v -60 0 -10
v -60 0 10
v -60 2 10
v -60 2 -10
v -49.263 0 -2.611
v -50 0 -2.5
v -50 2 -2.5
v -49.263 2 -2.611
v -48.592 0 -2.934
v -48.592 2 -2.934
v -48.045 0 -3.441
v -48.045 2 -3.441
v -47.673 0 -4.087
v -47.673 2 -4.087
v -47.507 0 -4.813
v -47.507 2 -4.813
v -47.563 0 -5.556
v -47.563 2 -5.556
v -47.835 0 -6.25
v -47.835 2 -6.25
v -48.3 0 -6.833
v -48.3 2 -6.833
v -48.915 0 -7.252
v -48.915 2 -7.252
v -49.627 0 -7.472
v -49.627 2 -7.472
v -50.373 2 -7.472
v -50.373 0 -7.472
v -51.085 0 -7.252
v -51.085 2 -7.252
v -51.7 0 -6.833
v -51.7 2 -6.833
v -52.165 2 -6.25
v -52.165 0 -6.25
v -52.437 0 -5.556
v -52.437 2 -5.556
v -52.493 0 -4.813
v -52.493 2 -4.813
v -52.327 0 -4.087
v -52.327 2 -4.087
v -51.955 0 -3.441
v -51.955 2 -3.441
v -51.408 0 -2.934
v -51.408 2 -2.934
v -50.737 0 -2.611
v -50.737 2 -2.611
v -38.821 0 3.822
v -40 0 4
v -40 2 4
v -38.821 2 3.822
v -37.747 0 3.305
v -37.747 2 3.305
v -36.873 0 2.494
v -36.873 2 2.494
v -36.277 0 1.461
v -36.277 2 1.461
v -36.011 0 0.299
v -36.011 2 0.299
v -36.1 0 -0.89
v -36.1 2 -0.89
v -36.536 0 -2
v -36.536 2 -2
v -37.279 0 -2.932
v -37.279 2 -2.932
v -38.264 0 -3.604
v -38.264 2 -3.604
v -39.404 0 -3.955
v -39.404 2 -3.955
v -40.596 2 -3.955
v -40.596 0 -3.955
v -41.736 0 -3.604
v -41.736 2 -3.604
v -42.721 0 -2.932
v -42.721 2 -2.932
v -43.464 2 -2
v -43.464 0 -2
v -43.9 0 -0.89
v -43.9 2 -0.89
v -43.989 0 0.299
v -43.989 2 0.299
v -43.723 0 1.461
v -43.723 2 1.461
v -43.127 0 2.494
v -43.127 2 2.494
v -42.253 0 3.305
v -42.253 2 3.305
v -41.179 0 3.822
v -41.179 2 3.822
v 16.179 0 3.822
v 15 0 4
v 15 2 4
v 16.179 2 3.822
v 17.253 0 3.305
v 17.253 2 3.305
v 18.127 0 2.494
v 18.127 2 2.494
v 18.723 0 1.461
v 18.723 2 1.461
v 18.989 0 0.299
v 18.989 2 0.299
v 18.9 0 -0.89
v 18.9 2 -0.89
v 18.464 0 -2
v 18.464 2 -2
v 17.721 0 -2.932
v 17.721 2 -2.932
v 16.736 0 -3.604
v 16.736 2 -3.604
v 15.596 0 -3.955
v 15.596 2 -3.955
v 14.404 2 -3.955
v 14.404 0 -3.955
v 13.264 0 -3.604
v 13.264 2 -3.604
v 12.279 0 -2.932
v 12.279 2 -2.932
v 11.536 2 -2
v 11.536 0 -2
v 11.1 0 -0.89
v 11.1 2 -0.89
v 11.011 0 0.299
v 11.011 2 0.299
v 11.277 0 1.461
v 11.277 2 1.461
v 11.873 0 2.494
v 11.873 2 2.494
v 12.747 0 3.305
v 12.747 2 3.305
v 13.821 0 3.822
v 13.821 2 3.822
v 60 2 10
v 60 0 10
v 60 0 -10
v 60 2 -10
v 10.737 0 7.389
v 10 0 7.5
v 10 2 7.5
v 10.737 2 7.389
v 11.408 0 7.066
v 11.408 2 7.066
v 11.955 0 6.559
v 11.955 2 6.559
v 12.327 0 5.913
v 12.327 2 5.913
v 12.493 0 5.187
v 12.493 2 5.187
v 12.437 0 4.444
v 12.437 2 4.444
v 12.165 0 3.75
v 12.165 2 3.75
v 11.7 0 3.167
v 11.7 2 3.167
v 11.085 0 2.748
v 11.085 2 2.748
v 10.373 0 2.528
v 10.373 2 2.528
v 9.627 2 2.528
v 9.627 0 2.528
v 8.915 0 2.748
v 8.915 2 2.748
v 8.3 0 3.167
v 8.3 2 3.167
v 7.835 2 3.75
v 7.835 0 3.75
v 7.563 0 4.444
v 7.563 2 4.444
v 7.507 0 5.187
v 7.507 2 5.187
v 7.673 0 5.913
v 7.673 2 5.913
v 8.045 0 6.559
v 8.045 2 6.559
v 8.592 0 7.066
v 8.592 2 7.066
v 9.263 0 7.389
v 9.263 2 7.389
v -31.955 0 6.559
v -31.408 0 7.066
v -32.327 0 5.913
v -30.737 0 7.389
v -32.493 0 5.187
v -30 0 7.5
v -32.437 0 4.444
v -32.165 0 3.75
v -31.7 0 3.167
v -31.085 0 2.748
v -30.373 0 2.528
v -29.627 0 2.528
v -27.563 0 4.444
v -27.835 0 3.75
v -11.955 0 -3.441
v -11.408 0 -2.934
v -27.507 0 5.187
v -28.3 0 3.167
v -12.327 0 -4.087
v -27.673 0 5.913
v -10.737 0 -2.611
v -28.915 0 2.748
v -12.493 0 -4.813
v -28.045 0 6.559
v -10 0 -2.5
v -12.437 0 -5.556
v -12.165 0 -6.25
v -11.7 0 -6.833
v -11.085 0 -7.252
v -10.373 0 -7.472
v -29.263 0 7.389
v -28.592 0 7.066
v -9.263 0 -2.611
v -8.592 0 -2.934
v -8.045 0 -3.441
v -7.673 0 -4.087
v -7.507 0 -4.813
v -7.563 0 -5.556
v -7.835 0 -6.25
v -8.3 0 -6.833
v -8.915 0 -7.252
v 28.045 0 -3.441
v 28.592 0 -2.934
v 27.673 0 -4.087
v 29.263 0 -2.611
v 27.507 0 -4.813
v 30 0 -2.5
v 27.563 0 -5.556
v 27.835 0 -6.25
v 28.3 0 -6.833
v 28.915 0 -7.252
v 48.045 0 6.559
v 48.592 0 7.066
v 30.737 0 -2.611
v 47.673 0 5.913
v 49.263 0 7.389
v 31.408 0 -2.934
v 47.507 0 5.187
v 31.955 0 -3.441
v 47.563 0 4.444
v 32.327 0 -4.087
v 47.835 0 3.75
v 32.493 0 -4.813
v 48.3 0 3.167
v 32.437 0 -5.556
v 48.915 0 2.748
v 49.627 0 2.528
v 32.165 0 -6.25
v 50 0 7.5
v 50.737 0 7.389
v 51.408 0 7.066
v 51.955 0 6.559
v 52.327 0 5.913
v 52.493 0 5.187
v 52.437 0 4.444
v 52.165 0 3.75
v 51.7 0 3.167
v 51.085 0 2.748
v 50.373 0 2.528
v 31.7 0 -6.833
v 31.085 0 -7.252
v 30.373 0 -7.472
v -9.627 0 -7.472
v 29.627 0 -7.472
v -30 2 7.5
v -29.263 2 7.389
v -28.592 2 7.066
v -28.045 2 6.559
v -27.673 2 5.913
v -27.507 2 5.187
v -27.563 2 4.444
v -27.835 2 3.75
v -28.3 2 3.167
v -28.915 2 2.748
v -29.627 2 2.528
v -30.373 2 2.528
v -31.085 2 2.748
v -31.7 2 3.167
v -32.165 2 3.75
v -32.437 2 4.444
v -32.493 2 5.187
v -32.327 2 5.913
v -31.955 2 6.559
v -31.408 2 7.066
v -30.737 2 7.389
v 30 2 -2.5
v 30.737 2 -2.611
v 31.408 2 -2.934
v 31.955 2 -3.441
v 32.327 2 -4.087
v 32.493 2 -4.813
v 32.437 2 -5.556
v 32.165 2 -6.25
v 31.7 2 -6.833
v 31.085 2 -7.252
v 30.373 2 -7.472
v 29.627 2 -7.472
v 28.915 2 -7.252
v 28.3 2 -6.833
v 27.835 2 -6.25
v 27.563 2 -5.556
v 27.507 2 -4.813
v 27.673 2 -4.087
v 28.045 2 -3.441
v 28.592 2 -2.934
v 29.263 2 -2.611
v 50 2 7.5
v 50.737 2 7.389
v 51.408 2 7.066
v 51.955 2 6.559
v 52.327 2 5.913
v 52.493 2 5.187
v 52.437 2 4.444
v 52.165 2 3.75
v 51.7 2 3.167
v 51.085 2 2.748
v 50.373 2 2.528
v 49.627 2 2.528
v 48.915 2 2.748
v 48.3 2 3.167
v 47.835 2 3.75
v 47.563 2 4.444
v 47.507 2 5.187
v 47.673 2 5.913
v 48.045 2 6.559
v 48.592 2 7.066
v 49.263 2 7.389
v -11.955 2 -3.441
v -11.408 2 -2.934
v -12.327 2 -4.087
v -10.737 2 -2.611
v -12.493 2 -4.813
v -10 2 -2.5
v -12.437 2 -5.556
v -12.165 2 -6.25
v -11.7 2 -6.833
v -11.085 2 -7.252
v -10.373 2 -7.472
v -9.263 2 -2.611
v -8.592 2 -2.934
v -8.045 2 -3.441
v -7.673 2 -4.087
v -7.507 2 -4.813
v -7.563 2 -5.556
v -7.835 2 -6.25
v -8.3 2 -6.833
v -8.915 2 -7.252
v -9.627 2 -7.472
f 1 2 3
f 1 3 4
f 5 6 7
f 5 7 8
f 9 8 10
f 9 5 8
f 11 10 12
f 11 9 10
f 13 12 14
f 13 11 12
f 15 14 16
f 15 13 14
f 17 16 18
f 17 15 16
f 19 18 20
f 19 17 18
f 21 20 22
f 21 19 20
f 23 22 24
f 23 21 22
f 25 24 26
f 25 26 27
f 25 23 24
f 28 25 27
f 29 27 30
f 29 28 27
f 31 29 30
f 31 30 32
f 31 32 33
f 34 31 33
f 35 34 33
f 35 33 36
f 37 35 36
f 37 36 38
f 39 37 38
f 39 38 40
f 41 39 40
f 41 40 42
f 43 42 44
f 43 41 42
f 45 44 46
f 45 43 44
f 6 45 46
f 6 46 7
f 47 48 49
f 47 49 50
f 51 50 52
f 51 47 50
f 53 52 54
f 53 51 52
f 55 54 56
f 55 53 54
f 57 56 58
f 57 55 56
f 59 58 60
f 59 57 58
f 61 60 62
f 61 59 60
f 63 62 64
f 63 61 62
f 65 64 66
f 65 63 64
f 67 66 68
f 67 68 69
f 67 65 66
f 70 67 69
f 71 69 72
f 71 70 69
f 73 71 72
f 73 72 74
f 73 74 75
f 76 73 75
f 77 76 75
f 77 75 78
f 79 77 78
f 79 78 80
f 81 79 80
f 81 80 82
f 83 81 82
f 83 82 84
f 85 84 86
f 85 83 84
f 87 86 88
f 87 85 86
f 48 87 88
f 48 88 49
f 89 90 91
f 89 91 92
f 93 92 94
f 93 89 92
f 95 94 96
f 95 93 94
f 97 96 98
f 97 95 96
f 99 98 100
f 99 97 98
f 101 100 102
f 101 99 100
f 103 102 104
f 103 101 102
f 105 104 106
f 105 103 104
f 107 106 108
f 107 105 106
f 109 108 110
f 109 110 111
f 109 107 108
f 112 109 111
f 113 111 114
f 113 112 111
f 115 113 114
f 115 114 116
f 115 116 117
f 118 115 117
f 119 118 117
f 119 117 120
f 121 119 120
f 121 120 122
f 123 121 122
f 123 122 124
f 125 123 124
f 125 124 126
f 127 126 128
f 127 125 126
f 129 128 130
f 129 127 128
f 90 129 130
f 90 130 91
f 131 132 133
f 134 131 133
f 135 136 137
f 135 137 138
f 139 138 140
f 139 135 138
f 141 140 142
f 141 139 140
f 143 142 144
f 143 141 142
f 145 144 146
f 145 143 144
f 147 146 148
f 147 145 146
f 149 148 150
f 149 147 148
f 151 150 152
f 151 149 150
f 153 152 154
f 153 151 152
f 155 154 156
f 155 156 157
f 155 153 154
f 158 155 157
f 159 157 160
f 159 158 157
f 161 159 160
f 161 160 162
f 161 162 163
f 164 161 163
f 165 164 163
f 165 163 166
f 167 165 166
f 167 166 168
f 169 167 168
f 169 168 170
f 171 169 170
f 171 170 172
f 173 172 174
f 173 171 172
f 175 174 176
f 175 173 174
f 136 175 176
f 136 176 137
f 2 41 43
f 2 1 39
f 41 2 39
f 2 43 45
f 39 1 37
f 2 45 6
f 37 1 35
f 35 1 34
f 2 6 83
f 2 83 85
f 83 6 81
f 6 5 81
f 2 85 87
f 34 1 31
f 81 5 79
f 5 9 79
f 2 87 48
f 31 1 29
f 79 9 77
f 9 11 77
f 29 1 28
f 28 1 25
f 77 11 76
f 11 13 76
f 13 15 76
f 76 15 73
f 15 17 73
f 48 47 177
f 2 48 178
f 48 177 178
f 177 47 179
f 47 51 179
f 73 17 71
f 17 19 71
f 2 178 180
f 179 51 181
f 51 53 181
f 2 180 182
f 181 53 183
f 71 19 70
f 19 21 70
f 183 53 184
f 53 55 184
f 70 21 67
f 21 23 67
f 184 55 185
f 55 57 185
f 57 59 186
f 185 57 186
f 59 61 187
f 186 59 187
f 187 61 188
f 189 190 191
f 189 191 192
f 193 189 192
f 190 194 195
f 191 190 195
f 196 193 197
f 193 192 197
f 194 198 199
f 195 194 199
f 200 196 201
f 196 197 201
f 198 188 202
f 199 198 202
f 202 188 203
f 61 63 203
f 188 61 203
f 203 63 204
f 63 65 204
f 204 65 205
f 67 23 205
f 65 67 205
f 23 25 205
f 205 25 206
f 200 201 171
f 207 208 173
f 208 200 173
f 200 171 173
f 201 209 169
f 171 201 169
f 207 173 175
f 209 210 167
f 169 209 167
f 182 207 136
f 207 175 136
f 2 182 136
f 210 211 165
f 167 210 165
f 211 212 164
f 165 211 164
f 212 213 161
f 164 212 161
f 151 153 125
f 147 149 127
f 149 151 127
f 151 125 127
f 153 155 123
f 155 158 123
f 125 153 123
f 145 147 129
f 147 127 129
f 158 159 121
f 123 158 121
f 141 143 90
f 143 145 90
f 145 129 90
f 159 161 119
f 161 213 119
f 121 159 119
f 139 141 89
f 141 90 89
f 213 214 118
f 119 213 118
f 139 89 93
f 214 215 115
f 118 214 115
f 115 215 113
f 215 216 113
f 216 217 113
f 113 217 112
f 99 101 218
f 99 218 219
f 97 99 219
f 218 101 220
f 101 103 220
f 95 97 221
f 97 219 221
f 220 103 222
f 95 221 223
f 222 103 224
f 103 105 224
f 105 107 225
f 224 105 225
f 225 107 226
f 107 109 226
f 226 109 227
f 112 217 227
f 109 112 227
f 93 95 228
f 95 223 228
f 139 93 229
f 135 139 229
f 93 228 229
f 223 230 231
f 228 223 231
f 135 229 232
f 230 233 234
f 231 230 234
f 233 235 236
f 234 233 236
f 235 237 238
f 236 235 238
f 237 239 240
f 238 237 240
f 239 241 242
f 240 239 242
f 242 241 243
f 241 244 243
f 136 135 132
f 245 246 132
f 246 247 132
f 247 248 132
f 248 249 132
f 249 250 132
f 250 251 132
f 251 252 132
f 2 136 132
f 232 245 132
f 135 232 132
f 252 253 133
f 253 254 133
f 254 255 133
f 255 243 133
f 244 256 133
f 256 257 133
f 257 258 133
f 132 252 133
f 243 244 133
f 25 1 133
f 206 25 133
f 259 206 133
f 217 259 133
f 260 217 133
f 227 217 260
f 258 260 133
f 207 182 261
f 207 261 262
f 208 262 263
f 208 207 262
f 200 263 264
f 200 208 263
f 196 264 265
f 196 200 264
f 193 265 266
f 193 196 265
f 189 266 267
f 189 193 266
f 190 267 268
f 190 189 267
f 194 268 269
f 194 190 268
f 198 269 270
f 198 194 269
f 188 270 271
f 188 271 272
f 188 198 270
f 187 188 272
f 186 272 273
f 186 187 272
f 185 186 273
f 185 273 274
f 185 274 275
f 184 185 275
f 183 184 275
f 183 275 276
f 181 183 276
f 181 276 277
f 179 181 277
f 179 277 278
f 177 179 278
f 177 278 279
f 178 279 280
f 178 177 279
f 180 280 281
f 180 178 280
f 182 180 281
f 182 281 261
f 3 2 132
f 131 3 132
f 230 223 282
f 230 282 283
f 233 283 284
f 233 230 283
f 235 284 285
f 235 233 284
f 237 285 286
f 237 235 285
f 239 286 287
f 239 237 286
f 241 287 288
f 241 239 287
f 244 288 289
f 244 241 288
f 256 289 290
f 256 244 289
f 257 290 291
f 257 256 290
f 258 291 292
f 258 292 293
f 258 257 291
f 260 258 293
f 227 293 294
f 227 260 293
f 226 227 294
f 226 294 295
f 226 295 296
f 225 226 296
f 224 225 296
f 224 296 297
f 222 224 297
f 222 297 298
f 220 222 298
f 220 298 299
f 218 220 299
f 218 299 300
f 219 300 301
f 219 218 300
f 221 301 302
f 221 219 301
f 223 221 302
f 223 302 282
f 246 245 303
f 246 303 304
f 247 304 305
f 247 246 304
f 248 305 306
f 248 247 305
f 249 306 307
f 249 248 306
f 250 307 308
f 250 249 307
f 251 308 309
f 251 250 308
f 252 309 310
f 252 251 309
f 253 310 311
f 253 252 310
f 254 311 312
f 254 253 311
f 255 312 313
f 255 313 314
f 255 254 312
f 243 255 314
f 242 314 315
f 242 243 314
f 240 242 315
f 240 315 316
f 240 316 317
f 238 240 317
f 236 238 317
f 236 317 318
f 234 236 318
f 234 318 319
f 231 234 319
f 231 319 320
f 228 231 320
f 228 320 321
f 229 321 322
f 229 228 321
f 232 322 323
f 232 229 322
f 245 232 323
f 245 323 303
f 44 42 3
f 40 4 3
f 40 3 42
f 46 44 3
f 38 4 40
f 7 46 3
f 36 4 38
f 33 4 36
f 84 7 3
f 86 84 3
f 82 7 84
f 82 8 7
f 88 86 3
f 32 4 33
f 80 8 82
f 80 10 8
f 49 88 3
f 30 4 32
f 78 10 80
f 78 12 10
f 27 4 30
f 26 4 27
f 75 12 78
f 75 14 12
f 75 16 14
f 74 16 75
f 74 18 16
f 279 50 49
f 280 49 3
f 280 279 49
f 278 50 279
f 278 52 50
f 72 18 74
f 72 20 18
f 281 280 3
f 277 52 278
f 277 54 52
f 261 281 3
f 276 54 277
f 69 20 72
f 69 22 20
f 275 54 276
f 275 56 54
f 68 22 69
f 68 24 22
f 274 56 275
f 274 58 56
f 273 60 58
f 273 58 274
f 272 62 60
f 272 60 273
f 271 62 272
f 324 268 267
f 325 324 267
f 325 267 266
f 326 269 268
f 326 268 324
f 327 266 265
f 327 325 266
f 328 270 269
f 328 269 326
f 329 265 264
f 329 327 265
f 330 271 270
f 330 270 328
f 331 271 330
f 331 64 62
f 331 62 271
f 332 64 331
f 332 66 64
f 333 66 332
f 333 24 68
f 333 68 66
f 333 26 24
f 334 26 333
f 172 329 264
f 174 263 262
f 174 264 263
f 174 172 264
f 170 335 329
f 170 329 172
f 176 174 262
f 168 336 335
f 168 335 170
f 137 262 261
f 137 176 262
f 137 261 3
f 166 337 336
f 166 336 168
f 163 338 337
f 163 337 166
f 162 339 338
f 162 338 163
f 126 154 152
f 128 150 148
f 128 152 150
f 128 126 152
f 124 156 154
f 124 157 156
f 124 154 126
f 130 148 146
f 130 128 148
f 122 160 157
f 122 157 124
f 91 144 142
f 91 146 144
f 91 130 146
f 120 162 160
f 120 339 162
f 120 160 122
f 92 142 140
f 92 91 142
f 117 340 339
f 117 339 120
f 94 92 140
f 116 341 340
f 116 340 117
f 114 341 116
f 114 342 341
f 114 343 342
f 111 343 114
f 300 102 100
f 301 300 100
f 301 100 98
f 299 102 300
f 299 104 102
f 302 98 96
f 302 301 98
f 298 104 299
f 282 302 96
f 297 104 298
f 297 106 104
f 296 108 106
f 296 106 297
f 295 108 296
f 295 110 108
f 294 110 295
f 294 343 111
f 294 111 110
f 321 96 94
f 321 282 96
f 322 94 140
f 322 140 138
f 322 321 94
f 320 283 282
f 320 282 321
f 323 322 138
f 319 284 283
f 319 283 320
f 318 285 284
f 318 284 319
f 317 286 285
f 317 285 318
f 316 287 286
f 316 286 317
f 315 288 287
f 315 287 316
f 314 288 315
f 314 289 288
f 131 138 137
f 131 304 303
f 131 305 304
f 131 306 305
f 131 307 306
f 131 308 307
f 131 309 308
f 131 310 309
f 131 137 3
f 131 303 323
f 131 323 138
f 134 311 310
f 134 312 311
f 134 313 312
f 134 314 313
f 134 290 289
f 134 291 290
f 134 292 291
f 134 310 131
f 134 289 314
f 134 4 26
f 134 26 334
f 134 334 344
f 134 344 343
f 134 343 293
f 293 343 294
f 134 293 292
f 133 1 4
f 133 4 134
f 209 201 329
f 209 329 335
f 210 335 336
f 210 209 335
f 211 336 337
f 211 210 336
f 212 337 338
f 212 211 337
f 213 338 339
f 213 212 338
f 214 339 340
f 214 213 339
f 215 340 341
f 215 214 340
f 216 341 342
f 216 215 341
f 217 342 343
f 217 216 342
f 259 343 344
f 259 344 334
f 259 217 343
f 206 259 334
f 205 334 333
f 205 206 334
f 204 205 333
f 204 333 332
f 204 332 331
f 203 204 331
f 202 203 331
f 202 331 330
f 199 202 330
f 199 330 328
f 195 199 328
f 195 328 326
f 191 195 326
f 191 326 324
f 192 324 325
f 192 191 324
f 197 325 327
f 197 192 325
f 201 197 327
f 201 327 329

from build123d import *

# Parameters (mm, degrees)
SKETCH_2_W      = 120
SKETCH_2_H      = 20
SKETCH_2_R      = 2.5
SKETCH_2_R_2    = 4
EXTRUDE_1_DEPTH = 2


with BuildPart() as part:
    # Эскиз2 → Бобышка-Вытянуть1 (new body)
    with BuildSketch(Plane(origin=(0, 0, 0), x_dir=(1, 0, 0), z_dir=(0, 1, 0))):
        Rectangle(SKETCH_2_W, SKETCH_2_H)
        with Locations(Location((-50, 5, 0), (0, 0, 270))):
            Circle(SKETCH_2_R, mode=Mode.SUBTRACT)
        with Locations(Location((-10, 5, 0), (0, 0, 270))):
            Circle(SKETCH_2_R, mode=Mode.SUBTRACT)
        with Locations(Location((30, 5, 0), (0, 0, 270))):
            Circle(SKETCH_2_R, mode=Mode.SUBTRACT)
        with Locations(Location((-30, -5, 0), (0, 0, 270))):
            Circle(SKETCH_2_R, mode=Mode.SUBTRACT)
        with Locations(Location((10, -5, 0), (0, 0, 270))):
            Circle(SKETCH_2_R, mode=Mode.SUBTRACT)
        with Locations(Location((50, -5, 0), (0, 0, 270))):
            Circle(SKETCH_2_R, mode=Mode.SUBTRACT)
        with Locations(Location((-40, 0, 0), (0, 0, 270))):
            Circle(SKETCH_2_R_2, mode=Mode.SUBTRACT)
        with Locations(Location((15, 0, 0), (0, 0, 270))):
            Circle(SKETCH_2_R_2, mode=Mode.SUBTRACT)
    extrude(amount=EXTRUDE_1_DEPTH)


solid = part.part
